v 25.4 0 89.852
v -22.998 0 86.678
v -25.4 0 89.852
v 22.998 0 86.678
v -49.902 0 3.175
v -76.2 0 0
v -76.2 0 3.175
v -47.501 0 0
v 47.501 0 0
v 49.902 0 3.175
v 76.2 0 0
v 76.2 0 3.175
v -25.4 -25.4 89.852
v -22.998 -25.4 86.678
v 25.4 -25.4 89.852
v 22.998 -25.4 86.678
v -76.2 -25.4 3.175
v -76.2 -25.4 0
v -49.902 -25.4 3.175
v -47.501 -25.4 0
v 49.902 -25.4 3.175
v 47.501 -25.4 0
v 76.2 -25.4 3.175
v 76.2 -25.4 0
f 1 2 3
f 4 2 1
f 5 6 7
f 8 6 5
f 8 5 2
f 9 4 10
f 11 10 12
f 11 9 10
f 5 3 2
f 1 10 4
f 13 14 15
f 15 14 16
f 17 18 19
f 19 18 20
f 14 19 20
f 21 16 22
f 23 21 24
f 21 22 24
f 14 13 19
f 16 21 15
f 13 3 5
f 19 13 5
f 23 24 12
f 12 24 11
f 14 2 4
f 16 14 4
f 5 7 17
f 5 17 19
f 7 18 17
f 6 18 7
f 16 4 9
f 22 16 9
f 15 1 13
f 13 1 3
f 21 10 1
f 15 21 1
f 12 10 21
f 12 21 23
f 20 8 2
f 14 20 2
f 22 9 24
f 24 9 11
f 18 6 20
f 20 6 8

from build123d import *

# Parameters (mm, degrees)
F1_DEPTH = 25.4
F2_W     = 28.575
F2_H     = 25.4
F3_DEPTH = 3.175


with BuildPart() as f1:
    # F0 (on Front) → F1 (new body)
    with BuildSketch(Plane.XZ):
        Polygon((-22.998106, 86.6775), (0, 86.6775), (0, 89.8525), (-25.4, 89.8525), (-50.8, 0), (-47.500579, 0), align=None)
        Polygon((22.998106, 86.6775), (47.500579, 0), (50.8, 0), (25.4, 89.8525), (0, 89.8525), (0, 86.6775), align=None)
    extrude(amount=F1_DEPTH)

    # F2 (on Top) → F3 (join)
    with BuildSketch(Plane.XY):
        with Locations((-61.9125, -12.7)):
            Rectangle(F2_W, F2_H)
        with Locations((61.9125, -12.7)):
            Rectangle(F2_W, F2_H)
    extrude(amount=F3_DEPTH)


solid = f1.part
